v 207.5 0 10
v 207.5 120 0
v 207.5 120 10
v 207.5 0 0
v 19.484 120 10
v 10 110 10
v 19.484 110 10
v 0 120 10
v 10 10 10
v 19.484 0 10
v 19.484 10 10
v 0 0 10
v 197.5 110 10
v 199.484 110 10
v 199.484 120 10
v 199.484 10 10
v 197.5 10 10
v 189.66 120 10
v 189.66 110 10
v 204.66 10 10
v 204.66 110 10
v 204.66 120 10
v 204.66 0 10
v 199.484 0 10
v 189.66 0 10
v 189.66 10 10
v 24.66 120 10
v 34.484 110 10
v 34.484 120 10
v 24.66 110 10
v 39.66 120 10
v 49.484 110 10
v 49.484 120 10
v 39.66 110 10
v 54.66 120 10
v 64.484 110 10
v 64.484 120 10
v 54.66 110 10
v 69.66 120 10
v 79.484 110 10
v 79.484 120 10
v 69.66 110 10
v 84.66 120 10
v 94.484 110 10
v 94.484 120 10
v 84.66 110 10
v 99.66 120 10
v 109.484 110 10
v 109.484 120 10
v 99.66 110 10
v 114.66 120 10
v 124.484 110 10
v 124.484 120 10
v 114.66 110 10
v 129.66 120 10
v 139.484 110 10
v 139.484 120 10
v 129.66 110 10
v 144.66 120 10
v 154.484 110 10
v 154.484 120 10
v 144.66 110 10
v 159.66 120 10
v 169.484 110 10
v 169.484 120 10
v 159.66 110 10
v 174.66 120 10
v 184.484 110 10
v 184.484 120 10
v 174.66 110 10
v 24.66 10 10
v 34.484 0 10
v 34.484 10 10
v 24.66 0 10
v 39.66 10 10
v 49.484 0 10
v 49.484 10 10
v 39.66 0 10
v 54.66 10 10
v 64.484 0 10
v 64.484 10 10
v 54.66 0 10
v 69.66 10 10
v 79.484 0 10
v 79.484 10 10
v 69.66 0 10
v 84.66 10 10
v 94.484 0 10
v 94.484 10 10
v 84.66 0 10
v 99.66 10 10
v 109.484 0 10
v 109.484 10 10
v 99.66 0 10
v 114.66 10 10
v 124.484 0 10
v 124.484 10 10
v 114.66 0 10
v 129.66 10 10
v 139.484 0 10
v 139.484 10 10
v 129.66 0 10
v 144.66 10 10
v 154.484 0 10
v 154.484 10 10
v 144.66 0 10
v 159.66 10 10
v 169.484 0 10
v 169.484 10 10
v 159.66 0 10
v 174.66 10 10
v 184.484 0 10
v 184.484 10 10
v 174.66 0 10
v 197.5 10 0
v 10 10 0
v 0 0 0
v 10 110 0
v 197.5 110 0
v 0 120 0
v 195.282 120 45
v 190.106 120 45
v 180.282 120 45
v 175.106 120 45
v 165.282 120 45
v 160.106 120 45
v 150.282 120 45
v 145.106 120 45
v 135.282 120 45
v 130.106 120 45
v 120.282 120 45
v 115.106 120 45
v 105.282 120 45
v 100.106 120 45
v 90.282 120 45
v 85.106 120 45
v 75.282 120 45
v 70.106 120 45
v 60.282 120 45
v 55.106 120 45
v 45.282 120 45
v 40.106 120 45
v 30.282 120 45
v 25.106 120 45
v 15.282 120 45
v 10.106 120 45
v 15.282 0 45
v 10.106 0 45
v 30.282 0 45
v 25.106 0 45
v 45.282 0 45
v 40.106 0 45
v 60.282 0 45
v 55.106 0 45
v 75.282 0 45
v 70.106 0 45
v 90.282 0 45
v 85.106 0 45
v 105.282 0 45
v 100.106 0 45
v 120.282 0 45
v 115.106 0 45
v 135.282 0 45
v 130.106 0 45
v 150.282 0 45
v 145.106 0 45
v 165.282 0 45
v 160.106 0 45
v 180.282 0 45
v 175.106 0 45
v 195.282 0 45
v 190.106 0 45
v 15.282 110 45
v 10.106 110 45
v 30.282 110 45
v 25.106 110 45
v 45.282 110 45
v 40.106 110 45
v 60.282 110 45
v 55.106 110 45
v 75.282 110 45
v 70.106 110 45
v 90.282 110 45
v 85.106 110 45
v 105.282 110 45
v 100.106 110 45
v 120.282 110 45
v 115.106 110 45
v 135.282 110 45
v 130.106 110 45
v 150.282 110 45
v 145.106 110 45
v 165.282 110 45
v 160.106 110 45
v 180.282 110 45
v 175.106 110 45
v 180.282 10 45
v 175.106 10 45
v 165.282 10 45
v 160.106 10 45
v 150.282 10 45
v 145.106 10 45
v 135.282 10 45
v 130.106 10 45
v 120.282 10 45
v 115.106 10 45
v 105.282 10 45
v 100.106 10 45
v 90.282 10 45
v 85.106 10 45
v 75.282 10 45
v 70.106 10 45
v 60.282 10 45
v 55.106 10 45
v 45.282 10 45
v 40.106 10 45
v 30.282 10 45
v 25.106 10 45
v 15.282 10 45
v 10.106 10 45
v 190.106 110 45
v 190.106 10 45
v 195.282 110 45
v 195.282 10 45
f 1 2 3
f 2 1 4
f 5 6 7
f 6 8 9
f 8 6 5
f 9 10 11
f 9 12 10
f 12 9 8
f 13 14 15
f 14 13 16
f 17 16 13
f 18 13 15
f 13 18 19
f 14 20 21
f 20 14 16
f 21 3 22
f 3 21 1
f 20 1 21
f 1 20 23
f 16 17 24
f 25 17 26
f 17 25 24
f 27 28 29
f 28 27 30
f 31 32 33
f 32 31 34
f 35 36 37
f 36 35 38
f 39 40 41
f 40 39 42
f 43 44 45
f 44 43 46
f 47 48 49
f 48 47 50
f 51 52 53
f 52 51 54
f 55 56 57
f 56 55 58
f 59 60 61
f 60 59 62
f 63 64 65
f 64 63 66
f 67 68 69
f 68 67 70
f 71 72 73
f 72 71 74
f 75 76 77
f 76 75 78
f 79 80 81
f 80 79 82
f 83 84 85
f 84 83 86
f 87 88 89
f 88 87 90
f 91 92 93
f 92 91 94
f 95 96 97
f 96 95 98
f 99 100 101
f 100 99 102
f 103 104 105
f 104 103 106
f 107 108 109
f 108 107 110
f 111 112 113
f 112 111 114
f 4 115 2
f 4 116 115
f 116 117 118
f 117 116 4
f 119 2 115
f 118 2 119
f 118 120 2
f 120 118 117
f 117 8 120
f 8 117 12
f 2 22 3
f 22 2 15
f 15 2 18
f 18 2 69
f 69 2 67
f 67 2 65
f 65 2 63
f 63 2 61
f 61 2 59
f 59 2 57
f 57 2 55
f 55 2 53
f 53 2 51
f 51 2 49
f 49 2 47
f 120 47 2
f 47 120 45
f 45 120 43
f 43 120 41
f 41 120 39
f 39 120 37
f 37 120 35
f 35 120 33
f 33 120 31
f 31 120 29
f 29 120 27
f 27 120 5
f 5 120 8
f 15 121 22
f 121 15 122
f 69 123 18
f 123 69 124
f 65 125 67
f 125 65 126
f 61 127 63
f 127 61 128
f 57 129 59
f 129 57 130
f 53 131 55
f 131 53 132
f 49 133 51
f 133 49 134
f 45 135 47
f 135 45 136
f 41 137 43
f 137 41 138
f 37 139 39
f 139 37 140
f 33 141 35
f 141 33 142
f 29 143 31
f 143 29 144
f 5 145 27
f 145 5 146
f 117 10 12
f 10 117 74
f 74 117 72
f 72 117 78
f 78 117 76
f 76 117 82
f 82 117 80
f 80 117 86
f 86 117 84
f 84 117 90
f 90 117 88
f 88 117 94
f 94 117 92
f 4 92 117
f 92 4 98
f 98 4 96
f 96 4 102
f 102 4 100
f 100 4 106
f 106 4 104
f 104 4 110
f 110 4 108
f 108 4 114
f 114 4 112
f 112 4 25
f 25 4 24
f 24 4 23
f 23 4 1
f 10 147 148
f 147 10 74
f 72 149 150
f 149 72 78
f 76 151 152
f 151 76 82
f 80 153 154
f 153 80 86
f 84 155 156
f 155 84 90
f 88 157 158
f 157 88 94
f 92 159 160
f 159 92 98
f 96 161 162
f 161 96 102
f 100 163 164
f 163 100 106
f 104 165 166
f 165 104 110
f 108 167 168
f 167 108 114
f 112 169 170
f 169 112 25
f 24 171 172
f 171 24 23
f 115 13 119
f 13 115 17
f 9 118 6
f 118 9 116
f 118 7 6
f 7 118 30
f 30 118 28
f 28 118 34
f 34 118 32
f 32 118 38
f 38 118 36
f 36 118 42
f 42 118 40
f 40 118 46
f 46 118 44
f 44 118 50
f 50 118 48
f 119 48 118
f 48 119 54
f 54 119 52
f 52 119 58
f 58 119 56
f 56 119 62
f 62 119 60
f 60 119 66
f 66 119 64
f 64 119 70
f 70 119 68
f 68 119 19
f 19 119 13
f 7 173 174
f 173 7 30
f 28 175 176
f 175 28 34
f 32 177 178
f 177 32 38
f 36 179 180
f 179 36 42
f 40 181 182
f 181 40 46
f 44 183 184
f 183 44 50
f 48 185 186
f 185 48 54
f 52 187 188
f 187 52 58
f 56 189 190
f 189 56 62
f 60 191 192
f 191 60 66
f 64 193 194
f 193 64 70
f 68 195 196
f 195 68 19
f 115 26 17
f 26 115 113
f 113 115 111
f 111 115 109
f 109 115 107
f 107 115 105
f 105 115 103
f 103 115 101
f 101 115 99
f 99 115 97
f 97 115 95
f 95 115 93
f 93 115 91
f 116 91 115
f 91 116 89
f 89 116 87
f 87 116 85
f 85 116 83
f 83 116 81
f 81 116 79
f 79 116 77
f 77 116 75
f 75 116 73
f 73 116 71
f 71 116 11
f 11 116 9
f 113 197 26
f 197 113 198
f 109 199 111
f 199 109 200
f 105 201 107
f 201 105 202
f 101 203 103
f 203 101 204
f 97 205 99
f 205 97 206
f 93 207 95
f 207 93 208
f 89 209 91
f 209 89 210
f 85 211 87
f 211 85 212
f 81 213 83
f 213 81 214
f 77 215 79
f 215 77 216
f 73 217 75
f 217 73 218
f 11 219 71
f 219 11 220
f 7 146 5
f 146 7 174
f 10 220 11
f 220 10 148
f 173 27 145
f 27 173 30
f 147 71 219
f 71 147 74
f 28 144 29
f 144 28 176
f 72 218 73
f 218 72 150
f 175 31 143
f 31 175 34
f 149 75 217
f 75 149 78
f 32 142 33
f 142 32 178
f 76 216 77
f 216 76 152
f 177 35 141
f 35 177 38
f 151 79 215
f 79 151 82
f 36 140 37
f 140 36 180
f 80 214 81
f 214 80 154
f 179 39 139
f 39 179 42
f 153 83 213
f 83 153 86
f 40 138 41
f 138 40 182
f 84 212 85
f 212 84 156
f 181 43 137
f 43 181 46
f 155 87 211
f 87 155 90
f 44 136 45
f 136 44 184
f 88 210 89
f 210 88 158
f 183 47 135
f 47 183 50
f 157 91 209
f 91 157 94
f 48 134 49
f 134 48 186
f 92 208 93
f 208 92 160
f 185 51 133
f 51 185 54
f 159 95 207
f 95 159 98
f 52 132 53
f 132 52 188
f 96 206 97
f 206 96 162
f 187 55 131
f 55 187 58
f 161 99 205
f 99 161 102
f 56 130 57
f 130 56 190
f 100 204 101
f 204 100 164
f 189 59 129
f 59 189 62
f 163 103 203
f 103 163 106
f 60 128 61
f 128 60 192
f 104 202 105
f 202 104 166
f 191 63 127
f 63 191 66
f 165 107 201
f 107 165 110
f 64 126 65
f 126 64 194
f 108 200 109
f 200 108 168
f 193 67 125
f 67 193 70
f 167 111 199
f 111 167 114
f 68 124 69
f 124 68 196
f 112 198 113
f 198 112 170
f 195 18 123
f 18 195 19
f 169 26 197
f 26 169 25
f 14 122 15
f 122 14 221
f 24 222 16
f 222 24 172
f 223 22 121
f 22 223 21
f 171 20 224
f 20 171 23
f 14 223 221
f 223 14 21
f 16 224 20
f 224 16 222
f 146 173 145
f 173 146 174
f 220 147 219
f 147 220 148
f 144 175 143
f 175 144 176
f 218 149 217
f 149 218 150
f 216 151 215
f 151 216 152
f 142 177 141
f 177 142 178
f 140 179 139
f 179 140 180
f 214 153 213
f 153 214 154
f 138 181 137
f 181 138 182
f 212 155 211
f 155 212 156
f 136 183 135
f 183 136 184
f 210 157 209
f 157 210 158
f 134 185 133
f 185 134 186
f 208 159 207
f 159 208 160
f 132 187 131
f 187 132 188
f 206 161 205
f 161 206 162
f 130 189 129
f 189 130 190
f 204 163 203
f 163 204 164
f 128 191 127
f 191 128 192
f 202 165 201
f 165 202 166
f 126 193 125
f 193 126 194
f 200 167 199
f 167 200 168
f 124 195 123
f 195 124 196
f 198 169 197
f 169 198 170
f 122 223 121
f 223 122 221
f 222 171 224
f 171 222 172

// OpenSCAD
//length = 415;

lngth = 415;
bar=5;
gap=10;
frm=10;
wdth=100;
hght=45;
ofst=26.0;
difference() {
    union() {
        difference() {
            cube([lngth/2, wdth + 2 * frm, frm]);
            translate([frm, frm, -0.01]) cube([lngth/2 - 2*frm, wdth, frm + 0.02]);
        }

        for (i = [0:gap + bar: lngth/2 -ofst])
        translate([ofst + i,0,5]) 
        rotate([0,-105,0]) 
        difference() {
            cube([hght + 10, wdth + 2*frm, bar]);
            translate([-0.01, frm, -0.01]) cube([hght+10.02, wdth, bar + 0.02]);
        }
    }
    translate([-lngth/2, -5, hght]) cube([lngth, wdth + 30, 20]);
    translate([lngth/2, -5, 0]) cube([lngth, wdth + 30, hght]);
}
